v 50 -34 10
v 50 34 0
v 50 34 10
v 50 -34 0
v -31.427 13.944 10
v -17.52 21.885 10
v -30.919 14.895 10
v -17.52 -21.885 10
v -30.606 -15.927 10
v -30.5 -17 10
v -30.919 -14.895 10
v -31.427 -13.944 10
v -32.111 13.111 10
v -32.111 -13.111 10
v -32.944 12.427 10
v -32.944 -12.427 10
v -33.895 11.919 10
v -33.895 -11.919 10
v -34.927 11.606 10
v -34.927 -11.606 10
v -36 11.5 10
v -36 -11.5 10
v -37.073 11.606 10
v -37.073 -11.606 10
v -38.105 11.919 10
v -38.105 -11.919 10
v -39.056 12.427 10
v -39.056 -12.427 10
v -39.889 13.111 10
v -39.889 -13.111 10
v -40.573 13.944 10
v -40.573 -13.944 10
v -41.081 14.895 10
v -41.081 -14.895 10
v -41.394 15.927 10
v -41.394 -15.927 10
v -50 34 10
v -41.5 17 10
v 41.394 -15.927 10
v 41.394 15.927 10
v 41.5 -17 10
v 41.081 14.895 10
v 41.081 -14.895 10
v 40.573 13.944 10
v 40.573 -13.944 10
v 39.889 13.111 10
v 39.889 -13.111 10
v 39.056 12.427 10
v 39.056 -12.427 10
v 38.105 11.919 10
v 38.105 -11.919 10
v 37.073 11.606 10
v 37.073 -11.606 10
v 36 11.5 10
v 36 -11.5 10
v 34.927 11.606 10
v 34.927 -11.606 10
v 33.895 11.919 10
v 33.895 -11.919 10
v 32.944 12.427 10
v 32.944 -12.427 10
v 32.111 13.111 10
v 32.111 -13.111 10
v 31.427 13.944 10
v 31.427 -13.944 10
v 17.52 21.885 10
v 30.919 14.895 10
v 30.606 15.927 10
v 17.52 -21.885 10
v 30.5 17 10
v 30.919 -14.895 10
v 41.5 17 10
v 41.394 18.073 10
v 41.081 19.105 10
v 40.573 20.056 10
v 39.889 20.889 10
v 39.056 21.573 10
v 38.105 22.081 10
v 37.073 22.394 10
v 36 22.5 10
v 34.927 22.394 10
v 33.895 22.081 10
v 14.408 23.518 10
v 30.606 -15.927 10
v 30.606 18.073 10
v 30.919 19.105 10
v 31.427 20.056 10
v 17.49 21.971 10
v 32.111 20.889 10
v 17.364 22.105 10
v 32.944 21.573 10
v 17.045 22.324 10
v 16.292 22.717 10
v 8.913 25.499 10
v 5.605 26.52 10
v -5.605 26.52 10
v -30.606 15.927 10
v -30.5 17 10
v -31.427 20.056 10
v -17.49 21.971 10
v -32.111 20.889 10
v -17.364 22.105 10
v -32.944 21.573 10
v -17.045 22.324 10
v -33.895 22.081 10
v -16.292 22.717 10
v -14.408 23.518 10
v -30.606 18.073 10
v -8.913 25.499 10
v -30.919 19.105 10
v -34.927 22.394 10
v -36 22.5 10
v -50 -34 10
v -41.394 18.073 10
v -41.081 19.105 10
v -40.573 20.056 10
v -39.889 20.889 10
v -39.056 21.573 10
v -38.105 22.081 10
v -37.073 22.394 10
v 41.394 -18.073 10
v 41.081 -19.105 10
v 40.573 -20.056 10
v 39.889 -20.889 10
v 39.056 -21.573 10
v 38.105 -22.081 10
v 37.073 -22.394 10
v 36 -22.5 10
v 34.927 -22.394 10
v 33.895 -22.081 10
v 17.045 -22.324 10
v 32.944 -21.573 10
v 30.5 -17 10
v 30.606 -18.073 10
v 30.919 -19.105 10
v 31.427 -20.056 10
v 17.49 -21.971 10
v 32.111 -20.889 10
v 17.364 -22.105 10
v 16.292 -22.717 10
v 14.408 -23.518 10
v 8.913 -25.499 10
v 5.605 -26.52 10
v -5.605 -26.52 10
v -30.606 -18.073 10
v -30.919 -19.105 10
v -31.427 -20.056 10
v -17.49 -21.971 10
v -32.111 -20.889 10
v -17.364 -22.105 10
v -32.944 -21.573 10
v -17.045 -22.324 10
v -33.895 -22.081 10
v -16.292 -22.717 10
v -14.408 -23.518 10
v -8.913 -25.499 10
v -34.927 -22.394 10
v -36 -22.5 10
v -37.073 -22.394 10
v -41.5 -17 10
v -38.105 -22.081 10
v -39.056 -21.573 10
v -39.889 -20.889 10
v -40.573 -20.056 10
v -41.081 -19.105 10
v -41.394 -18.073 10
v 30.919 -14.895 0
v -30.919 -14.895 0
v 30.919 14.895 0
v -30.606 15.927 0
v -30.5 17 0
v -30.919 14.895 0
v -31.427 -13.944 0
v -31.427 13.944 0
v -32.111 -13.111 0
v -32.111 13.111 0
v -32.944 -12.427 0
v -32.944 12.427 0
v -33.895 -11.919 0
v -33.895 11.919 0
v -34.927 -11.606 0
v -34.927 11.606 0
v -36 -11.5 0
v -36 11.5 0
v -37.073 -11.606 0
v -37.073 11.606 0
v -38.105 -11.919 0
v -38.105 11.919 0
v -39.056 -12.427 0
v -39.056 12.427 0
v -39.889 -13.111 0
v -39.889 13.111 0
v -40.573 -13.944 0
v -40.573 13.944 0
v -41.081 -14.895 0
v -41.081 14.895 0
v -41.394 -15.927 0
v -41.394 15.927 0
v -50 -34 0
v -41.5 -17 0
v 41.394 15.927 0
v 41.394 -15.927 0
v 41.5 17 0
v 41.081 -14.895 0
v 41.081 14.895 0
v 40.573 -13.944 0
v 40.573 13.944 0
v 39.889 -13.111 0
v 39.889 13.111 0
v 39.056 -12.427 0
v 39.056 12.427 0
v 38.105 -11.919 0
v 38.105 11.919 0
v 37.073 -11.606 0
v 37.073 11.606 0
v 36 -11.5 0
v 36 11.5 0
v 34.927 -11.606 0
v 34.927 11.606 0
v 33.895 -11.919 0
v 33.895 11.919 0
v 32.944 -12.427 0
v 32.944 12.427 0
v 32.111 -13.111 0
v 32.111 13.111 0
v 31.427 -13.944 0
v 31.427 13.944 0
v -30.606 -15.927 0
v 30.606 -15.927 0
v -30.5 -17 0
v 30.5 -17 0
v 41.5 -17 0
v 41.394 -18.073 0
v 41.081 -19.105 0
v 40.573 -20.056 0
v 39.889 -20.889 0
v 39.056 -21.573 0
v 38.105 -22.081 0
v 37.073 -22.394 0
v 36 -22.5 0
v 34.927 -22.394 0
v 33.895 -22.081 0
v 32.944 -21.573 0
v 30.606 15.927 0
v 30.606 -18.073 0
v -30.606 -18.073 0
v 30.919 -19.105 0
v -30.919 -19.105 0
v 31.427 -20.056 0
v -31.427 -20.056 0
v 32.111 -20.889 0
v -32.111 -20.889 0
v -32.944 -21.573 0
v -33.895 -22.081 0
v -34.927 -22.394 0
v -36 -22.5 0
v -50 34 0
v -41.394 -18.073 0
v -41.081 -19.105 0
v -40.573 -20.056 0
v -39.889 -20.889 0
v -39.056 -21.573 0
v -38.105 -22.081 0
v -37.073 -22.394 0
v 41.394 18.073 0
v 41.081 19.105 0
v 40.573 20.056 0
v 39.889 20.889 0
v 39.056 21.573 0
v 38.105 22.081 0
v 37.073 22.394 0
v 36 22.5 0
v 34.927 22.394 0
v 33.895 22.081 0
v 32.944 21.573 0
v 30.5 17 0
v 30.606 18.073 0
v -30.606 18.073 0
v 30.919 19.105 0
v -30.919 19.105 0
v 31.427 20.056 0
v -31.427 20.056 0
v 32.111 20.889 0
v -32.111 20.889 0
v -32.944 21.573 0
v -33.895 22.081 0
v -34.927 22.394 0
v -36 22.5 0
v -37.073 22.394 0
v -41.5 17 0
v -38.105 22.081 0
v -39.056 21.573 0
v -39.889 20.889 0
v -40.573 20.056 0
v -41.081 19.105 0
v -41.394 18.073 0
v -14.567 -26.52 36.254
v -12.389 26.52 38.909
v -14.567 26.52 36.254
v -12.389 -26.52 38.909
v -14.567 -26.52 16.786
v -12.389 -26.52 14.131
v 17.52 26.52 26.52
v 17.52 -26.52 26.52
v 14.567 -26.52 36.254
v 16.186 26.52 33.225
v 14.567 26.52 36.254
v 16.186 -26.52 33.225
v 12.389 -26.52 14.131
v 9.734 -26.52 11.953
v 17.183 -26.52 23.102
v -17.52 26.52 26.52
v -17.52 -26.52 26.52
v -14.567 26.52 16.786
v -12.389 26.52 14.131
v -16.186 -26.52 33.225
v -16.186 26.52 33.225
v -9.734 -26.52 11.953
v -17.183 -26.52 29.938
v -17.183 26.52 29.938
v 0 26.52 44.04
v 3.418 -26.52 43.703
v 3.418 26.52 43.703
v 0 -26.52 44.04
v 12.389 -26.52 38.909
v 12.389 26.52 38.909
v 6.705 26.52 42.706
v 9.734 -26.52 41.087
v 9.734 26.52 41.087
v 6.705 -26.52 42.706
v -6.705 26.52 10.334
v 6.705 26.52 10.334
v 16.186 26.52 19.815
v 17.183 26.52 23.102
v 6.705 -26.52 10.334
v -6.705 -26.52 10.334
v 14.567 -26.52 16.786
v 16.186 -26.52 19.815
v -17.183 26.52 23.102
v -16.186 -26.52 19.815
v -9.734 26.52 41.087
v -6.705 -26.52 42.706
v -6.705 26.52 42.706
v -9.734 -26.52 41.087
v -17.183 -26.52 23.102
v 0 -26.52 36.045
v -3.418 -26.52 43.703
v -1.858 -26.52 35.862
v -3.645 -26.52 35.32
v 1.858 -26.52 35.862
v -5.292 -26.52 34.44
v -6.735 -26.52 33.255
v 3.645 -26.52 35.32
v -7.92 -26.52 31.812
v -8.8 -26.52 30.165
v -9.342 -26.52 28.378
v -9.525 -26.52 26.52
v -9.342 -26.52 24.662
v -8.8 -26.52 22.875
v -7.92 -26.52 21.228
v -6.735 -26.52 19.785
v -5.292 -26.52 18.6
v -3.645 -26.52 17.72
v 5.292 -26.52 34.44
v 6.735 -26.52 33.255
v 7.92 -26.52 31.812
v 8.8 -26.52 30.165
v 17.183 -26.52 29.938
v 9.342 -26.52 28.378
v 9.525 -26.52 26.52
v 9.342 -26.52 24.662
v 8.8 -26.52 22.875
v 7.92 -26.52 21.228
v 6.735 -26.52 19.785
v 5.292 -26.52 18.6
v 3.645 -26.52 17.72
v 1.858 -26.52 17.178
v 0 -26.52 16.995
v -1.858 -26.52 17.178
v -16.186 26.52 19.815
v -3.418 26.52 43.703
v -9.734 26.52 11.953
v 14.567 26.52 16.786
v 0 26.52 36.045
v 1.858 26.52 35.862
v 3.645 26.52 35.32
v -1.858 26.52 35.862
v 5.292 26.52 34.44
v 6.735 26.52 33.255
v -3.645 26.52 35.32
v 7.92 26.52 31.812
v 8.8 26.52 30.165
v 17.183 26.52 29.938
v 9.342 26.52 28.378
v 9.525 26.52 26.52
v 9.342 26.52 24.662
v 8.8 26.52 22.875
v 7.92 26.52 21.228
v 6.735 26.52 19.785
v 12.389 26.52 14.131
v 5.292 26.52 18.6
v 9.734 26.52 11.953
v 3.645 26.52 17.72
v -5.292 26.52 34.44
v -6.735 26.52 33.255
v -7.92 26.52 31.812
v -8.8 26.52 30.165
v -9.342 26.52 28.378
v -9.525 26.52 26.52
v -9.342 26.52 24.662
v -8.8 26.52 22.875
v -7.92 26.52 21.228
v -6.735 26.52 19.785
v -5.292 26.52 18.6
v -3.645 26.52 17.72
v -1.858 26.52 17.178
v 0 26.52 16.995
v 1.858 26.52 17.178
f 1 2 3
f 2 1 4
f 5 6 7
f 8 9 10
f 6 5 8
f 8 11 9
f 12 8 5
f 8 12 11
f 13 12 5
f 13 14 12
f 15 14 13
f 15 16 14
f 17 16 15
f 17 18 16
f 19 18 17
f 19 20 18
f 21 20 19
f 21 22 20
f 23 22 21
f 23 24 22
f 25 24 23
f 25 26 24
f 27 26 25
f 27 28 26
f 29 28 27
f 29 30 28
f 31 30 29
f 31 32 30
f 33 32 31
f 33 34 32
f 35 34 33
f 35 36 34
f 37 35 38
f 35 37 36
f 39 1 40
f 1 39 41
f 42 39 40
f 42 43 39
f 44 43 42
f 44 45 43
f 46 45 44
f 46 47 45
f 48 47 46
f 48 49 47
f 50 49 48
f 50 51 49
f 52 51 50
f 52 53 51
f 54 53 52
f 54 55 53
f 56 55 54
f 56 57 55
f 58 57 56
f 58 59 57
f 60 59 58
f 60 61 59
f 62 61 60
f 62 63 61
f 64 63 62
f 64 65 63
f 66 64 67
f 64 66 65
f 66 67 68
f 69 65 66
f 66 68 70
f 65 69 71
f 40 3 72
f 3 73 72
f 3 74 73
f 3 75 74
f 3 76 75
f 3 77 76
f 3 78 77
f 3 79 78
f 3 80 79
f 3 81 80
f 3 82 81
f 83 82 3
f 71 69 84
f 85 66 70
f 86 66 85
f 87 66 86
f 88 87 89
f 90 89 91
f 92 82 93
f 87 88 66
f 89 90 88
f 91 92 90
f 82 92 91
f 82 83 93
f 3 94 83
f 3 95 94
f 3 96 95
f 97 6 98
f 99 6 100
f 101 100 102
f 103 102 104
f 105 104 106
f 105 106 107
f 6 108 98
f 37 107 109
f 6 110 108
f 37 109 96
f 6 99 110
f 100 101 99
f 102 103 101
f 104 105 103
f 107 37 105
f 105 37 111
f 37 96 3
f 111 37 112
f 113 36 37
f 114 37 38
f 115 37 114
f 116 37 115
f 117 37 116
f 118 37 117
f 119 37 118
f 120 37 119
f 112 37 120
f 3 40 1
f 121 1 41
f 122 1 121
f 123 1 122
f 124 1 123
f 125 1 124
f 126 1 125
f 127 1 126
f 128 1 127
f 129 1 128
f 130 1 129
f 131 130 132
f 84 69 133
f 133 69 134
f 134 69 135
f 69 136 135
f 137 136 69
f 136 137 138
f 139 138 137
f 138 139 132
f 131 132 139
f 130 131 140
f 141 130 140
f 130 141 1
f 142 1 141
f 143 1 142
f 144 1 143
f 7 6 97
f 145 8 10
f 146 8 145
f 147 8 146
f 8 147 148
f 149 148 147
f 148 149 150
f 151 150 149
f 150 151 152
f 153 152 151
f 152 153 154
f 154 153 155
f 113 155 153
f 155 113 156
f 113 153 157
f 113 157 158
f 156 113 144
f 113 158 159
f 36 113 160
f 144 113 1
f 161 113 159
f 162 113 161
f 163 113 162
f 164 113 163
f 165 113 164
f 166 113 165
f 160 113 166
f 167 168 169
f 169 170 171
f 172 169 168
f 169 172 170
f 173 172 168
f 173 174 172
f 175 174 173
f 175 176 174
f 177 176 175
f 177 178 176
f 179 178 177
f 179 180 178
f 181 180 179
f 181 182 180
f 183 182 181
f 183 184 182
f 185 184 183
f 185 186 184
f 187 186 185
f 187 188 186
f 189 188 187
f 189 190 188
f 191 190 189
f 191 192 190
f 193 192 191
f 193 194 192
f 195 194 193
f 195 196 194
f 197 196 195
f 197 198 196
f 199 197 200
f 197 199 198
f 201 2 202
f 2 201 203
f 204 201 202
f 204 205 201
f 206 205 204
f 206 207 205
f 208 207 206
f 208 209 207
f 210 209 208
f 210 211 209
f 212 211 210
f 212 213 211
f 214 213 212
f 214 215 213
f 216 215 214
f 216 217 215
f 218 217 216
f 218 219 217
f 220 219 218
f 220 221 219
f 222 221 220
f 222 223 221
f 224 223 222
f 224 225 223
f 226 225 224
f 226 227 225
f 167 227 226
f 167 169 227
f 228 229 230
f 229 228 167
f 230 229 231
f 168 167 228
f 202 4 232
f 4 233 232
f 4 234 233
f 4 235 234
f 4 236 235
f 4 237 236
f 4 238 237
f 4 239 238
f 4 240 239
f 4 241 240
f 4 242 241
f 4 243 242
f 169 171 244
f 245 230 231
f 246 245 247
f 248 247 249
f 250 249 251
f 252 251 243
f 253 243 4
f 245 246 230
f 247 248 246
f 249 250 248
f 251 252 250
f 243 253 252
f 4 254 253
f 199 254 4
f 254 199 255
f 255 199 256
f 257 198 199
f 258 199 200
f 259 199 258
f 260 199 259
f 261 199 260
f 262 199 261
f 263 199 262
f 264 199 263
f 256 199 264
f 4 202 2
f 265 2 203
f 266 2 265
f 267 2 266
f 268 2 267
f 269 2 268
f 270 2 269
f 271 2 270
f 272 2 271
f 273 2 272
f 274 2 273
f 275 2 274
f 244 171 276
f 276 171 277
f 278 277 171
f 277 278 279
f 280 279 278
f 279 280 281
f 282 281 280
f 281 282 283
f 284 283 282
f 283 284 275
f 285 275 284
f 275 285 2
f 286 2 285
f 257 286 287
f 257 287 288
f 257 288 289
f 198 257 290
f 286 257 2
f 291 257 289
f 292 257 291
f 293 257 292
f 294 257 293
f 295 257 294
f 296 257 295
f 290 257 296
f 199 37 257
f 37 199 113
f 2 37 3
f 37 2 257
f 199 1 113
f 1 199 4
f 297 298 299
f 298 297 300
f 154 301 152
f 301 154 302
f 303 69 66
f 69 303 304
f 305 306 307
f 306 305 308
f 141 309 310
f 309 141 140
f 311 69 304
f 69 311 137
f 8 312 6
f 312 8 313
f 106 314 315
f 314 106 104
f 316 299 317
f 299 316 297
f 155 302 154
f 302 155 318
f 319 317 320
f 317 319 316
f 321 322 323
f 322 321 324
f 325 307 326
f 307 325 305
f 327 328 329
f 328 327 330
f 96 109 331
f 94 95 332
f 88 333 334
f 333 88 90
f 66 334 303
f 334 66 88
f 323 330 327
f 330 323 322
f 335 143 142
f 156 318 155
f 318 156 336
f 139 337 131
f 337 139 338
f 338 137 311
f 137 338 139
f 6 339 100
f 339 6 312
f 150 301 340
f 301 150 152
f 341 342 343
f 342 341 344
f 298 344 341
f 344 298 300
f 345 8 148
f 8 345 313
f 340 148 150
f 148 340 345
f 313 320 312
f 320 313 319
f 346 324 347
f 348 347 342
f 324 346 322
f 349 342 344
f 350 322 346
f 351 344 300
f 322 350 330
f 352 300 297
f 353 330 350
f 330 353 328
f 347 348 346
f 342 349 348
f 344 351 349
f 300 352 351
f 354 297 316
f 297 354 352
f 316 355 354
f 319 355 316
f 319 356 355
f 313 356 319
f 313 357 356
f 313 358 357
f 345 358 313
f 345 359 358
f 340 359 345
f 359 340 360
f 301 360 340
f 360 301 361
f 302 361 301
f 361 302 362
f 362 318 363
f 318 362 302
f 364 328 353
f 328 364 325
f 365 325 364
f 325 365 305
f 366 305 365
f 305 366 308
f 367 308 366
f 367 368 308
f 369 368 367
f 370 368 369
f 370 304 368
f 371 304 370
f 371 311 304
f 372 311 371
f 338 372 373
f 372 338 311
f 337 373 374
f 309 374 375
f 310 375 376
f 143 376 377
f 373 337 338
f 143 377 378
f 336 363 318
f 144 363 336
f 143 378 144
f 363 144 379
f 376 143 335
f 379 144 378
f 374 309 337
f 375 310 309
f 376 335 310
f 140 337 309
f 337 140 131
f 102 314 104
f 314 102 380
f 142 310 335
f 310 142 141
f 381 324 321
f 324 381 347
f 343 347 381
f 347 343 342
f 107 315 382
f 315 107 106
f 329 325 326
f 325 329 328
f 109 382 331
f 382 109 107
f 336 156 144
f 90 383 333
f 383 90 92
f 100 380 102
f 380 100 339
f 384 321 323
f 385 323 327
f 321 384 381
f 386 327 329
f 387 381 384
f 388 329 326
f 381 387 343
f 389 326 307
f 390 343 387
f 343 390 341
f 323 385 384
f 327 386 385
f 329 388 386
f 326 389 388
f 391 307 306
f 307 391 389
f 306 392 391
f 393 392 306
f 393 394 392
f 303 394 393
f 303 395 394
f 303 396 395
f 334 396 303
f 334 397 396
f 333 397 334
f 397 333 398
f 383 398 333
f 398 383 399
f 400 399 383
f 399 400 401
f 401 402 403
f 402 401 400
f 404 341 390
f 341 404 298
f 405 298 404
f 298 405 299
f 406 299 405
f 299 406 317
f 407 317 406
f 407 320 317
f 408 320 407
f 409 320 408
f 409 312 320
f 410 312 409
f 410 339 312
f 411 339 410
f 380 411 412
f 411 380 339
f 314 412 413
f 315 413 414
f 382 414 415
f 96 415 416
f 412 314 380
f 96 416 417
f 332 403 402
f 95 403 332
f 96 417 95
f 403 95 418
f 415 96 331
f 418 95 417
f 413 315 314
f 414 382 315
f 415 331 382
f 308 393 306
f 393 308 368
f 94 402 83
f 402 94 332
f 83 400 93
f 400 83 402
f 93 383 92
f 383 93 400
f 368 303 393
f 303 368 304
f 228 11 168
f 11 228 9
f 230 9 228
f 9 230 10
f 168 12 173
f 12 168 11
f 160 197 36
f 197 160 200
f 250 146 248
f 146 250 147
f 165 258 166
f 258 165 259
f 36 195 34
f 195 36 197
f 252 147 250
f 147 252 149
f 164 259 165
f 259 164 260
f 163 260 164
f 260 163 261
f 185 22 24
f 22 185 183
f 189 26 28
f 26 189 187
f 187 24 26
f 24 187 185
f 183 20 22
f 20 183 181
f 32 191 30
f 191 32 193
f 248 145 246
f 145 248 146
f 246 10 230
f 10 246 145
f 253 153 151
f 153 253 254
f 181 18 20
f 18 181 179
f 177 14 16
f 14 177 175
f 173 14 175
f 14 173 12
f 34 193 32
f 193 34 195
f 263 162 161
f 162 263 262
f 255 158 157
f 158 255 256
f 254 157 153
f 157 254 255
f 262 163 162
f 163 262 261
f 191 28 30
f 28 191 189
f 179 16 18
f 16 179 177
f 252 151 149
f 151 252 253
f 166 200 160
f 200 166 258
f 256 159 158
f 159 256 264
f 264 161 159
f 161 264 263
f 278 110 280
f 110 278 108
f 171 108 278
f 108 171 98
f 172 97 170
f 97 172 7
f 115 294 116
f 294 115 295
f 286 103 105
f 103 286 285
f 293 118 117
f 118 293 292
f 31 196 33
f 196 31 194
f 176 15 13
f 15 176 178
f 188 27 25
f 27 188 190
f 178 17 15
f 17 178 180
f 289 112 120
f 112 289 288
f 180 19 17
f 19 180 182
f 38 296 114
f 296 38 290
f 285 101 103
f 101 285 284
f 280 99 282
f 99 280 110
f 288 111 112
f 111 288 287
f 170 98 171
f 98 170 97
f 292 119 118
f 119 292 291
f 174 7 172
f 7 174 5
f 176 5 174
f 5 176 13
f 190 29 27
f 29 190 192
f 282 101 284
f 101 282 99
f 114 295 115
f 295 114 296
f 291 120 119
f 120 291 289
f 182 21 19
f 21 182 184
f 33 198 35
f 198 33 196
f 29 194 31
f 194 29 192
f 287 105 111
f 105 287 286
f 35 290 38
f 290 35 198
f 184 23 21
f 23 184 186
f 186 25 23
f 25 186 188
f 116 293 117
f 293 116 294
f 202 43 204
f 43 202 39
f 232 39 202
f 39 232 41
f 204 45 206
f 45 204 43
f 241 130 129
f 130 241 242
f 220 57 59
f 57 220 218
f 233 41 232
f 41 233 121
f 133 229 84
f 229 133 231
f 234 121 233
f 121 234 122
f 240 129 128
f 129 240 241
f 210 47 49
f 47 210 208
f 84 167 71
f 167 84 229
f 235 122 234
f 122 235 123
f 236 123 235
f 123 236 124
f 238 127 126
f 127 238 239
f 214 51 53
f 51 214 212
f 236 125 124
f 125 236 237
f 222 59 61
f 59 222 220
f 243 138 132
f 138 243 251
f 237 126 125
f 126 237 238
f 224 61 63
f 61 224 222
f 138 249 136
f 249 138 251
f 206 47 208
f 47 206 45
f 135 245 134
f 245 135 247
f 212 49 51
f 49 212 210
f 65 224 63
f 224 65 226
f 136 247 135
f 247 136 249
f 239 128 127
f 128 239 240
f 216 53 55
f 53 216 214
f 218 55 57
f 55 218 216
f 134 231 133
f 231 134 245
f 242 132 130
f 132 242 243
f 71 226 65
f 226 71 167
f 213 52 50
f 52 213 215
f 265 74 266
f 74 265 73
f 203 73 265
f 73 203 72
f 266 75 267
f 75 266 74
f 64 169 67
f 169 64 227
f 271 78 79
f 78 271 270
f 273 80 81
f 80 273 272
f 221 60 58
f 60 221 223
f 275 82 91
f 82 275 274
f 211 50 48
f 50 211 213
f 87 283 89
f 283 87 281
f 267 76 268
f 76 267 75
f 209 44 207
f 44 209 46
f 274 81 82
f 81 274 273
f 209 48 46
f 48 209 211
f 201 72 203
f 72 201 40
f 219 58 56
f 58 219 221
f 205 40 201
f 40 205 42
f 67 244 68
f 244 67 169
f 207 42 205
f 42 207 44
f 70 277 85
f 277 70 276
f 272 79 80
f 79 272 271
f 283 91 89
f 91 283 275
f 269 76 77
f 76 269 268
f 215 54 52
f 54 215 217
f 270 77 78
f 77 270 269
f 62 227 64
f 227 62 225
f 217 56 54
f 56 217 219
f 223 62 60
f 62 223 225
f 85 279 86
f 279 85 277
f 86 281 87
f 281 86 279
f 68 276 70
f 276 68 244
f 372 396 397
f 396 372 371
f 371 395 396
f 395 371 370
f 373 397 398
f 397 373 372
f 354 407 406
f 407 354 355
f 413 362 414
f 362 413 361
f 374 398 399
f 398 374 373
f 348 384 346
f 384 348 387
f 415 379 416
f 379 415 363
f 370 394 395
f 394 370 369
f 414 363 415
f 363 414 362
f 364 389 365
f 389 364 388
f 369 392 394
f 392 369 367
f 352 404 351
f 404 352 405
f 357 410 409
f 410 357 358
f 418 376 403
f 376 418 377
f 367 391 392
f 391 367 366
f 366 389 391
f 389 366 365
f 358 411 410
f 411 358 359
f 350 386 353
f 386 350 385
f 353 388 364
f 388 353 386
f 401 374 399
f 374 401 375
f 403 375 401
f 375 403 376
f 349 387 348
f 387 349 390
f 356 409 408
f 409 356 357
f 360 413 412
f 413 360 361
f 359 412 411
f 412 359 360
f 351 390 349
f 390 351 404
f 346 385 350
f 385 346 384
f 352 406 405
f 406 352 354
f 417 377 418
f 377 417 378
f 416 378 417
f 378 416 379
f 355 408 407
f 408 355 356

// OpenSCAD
$fn = 32;

// ----------------------------------------------------------------------
// Bearing block: 100 x 68 mm base, 19.05 mm bore at 26.52 mm
// ----------------------------------------------------------------------

// --- parameters (mm) ---
base_w = 100;             // base width
base_d = 68;              // base depth
base_t = 10;              // base thickness
bore_d = 19.05;           // shaft / bearing bore
house_r = 17.52;          // housing outer radius
house_len = 53.04;        // housing length along the shaft
foot_w = 35.04;           // foot width under the housing
foot_len = 43.04;         // foot length along the shaft
axis_z = 26.52;           // bore axis height above the base
holes_d = 11;             // mounting holes
hole_x = 36;              // mounting hole spacing

difference() {
  union() {
    /* base plate with its underside on z = 0 */
    translate([0, 0, base_t / 2]) cube([base_w, base_d, base_t], center = true);
    /* hull foot: a straight web blending into the round housing */
    hull() {
      translate([0, 0, base_t - 0.5]) cube([foot_w, foot_len, 1.6], center = true);
      translate([0, 0, axis_z]) rotate([-90, 0, 0]) cylinder(h = house_len, d = 2 * house_r, center = true);
    }
  }
  /* bore through the housing, 2.5 mm clear on both sides */
  translate([0, 0, axis_z]) rotate([-90, 0, 0]) cylinder(h = house_len + 5, d = bore_d, center = true);
  /* mounting holes through the base plate */
  for (hx = [-36, 36]) {
    for (hy = [-17, 17]) {
      translate([hx, hy, -2.5]) cylinder(h = base_t + 5, d = holes_d);
    }
  }
}
